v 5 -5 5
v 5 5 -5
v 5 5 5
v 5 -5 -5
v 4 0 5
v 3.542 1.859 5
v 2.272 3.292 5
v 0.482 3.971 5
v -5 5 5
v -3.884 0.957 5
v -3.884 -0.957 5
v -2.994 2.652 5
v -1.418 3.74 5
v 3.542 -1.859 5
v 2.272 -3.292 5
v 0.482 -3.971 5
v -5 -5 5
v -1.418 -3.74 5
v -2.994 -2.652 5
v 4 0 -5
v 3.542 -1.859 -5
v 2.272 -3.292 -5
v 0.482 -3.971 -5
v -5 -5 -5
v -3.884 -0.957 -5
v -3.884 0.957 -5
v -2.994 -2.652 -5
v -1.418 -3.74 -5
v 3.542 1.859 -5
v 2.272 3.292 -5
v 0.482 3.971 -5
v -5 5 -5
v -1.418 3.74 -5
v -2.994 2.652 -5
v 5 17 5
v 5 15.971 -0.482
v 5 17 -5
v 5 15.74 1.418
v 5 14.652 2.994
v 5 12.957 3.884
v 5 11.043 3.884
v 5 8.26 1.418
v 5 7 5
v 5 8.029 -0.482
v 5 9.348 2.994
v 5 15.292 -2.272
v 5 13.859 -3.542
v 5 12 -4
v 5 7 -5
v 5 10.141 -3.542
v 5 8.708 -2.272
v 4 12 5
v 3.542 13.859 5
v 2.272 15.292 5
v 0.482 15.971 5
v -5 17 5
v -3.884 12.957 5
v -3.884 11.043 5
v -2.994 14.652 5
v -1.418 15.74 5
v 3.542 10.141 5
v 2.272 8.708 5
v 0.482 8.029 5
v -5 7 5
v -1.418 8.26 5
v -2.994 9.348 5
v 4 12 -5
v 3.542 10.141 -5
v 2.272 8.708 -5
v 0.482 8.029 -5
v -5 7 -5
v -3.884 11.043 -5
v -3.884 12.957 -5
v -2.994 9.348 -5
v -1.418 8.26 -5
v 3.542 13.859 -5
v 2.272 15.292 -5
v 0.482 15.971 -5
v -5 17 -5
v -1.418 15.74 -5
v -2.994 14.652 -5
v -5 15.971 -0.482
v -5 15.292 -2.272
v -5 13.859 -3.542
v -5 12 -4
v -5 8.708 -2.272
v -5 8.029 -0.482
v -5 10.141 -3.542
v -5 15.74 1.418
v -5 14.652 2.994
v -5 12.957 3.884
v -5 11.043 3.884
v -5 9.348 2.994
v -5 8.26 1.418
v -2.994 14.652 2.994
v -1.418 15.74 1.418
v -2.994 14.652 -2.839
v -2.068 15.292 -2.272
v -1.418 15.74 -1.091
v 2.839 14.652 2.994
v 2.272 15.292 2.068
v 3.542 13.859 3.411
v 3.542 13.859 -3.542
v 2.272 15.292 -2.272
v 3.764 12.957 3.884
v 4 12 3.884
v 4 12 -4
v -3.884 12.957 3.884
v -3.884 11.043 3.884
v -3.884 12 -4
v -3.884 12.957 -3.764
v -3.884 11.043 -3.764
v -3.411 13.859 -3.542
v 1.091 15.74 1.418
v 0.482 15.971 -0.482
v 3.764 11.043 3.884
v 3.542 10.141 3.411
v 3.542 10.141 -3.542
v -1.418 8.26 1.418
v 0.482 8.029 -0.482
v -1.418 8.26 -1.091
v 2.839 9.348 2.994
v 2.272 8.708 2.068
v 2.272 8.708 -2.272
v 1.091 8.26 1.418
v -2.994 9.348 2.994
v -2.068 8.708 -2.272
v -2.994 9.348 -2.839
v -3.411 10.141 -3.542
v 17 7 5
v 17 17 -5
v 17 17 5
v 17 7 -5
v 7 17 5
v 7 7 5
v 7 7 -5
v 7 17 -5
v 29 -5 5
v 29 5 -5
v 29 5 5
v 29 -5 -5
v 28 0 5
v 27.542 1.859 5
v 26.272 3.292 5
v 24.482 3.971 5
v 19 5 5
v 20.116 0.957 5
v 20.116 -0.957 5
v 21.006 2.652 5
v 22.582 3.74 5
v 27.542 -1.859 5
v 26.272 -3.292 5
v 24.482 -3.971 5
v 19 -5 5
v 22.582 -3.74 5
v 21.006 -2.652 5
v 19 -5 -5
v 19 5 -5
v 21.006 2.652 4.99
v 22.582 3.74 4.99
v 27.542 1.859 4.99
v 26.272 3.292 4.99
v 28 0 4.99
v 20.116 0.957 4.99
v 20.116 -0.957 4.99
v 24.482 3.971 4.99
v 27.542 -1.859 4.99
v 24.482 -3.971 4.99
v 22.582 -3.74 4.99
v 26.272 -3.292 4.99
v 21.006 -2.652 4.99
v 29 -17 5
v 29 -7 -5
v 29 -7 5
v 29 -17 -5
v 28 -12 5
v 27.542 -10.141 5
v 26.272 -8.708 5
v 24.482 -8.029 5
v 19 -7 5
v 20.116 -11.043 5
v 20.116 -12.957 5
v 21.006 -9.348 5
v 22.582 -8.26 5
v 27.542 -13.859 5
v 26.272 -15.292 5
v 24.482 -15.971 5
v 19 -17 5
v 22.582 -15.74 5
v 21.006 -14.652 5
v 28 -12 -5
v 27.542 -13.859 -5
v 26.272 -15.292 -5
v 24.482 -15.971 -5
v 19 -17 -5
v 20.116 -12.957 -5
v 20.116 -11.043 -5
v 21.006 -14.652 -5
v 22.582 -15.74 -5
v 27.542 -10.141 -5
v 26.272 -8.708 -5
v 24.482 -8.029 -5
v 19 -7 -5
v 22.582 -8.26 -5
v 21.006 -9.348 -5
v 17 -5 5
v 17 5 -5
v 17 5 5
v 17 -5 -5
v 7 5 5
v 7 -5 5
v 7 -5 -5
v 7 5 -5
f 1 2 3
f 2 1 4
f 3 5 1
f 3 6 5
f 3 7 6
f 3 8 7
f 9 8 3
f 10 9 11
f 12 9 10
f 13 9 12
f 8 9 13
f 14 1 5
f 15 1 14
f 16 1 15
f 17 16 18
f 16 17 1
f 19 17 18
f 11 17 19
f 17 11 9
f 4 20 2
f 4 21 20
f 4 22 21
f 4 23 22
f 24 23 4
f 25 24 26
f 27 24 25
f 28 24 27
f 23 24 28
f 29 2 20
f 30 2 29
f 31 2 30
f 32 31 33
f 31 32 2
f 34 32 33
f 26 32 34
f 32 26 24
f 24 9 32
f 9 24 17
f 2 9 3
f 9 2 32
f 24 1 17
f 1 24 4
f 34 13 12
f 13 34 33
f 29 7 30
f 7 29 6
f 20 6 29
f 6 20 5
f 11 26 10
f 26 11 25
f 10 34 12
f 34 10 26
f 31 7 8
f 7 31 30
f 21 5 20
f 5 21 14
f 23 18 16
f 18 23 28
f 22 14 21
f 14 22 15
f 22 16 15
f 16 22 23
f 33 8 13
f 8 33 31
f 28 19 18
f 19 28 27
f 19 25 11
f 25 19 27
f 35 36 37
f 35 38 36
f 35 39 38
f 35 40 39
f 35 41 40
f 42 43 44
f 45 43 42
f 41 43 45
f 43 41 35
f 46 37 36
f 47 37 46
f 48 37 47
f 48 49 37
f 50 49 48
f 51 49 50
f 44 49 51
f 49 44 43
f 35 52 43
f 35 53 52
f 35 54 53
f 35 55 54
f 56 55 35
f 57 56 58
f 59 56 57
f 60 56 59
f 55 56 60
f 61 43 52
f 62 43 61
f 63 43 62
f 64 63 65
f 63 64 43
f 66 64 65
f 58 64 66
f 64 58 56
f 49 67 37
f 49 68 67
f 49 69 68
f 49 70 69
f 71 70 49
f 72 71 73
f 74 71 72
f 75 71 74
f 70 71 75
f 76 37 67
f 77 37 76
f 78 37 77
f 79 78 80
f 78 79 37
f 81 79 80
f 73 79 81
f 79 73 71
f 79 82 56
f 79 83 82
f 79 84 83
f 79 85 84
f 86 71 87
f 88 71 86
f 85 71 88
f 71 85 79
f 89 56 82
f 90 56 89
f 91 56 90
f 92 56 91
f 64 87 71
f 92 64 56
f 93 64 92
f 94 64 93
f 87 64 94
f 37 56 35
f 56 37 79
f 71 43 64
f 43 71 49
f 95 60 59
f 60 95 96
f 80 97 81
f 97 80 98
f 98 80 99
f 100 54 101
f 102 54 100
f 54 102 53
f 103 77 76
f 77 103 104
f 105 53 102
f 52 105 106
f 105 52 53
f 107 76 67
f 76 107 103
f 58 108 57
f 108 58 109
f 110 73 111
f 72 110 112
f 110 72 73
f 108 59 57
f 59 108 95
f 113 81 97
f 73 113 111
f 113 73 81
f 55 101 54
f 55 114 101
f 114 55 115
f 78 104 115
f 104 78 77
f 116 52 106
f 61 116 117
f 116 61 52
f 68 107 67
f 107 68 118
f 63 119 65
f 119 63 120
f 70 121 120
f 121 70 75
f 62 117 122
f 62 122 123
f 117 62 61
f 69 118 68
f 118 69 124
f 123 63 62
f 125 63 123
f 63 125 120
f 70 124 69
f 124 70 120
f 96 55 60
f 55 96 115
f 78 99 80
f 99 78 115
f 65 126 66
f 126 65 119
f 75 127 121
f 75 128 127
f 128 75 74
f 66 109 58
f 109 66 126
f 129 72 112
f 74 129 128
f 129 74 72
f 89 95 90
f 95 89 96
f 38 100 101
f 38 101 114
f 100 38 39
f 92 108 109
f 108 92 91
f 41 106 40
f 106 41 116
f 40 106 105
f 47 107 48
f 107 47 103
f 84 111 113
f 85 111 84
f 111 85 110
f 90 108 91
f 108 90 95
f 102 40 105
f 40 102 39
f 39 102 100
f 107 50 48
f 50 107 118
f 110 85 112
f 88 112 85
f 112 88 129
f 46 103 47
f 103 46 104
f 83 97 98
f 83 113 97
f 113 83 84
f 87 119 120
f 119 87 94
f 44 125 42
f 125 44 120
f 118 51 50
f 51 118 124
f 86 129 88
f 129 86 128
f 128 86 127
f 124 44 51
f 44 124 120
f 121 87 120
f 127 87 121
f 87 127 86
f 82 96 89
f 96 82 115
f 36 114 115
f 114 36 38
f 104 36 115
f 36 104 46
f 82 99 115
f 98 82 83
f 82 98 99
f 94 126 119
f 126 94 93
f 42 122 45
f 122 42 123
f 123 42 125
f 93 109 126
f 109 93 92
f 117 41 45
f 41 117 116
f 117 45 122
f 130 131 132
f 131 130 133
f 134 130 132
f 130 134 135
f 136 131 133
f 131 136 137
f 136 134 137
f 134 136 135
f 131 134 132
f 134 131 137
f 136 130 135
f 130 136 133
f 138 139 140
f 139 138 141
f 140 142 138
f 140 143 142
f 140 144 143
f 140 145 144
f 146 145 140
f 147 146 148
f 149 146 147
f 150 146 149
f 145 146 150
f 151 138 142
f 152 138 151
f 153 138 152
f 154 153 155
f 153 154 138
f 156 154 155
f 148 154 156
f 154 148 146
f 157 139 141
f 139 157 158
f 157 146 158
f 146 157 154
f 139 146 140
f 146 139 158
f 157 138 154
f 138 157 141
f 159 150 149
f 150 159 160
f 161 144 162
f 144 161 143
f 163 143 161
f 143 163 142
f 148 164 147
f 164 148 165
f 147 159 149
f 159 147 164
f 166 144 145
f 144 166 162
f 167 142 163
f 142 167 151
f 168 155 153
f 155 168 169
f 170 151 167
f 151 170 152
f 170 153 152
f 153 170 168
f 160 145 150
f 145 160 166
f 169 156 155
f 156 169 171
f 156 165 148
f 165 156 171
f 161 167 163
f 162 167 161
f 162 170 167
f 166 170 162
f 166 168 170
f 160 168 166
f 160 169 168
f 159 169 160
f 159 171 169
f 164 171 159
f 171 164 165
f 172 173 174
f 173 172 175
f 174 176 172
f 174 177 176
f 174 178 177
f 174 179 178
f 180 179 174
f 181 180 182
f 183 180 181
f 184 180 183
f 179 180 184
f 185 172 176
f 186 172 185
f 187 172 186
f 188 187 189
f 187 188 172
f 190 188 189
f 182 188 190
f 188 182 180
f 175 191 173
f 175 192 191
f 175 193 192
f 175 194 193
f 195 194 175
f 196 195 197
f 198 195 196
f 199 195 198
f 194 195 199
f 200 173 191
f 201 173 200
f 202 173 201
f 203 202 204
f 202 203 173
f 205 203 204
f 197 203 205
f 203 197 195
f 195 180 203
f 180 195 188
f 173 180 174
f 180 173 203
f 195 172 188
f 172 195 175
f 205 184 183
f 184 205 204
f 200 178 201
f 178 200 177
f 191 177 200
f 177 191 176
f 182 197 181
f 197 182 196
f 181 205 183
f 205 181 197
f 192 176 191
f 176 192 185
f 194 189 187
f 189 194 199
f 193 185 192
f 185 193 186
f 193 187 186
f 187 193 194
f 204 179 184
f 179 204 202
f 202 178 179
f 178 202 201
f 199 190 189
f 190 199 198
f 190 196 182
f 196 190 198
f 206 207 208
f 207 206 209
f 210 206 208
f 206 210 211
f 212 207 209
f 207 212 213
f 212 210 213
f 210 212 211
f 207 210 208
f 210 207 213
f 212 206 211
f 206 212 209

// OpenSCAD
// Empty
difference();
// No children
difference() { }

// Basic
difference() {
  cube([10,10,10], center=true);
  cylinder(r=4, h=20, center=true);
}

// Two negative objects
translate([0,12,0]) difference() {
  cube([10,10,10], center=true);
  cylinder(r=4, h=11, center=true);
  rotate([0,90,0]) cylinder(r=4, h=11, center=true);
}

// Not intersecting
translate([12,12,0]) difference() {
  cube([10,10,10], center=true);
  translate([0,0,7.01]) cylinder(r=4, h=4, center=true);
}

// Barely intersecting
translate([24,0,0]) difference() {
  cube([10,10,10], center=true);
  translate([0,0,6.99]) cylinder(r=4, h=4, center=true);
}

// Subtracting something from nothing
translate([24,12,0]) difference() {
  cube([0,10,10], center=true);
  # cylinder(r=4, h=20, center=true);
}

// Non-geometry (echo) statement as first child should be ignored
translate([24,-12,0]) difference() {
  echo("difference-tests");
  cube([10,10,10], center=true);
  cylinder(r=4, h=20, center=true);
}

// Subtracting 2D from 3D
translate([12,0,0]) difference() {
  cube([10,10,10], center=true);
  circle(r=6);
}
